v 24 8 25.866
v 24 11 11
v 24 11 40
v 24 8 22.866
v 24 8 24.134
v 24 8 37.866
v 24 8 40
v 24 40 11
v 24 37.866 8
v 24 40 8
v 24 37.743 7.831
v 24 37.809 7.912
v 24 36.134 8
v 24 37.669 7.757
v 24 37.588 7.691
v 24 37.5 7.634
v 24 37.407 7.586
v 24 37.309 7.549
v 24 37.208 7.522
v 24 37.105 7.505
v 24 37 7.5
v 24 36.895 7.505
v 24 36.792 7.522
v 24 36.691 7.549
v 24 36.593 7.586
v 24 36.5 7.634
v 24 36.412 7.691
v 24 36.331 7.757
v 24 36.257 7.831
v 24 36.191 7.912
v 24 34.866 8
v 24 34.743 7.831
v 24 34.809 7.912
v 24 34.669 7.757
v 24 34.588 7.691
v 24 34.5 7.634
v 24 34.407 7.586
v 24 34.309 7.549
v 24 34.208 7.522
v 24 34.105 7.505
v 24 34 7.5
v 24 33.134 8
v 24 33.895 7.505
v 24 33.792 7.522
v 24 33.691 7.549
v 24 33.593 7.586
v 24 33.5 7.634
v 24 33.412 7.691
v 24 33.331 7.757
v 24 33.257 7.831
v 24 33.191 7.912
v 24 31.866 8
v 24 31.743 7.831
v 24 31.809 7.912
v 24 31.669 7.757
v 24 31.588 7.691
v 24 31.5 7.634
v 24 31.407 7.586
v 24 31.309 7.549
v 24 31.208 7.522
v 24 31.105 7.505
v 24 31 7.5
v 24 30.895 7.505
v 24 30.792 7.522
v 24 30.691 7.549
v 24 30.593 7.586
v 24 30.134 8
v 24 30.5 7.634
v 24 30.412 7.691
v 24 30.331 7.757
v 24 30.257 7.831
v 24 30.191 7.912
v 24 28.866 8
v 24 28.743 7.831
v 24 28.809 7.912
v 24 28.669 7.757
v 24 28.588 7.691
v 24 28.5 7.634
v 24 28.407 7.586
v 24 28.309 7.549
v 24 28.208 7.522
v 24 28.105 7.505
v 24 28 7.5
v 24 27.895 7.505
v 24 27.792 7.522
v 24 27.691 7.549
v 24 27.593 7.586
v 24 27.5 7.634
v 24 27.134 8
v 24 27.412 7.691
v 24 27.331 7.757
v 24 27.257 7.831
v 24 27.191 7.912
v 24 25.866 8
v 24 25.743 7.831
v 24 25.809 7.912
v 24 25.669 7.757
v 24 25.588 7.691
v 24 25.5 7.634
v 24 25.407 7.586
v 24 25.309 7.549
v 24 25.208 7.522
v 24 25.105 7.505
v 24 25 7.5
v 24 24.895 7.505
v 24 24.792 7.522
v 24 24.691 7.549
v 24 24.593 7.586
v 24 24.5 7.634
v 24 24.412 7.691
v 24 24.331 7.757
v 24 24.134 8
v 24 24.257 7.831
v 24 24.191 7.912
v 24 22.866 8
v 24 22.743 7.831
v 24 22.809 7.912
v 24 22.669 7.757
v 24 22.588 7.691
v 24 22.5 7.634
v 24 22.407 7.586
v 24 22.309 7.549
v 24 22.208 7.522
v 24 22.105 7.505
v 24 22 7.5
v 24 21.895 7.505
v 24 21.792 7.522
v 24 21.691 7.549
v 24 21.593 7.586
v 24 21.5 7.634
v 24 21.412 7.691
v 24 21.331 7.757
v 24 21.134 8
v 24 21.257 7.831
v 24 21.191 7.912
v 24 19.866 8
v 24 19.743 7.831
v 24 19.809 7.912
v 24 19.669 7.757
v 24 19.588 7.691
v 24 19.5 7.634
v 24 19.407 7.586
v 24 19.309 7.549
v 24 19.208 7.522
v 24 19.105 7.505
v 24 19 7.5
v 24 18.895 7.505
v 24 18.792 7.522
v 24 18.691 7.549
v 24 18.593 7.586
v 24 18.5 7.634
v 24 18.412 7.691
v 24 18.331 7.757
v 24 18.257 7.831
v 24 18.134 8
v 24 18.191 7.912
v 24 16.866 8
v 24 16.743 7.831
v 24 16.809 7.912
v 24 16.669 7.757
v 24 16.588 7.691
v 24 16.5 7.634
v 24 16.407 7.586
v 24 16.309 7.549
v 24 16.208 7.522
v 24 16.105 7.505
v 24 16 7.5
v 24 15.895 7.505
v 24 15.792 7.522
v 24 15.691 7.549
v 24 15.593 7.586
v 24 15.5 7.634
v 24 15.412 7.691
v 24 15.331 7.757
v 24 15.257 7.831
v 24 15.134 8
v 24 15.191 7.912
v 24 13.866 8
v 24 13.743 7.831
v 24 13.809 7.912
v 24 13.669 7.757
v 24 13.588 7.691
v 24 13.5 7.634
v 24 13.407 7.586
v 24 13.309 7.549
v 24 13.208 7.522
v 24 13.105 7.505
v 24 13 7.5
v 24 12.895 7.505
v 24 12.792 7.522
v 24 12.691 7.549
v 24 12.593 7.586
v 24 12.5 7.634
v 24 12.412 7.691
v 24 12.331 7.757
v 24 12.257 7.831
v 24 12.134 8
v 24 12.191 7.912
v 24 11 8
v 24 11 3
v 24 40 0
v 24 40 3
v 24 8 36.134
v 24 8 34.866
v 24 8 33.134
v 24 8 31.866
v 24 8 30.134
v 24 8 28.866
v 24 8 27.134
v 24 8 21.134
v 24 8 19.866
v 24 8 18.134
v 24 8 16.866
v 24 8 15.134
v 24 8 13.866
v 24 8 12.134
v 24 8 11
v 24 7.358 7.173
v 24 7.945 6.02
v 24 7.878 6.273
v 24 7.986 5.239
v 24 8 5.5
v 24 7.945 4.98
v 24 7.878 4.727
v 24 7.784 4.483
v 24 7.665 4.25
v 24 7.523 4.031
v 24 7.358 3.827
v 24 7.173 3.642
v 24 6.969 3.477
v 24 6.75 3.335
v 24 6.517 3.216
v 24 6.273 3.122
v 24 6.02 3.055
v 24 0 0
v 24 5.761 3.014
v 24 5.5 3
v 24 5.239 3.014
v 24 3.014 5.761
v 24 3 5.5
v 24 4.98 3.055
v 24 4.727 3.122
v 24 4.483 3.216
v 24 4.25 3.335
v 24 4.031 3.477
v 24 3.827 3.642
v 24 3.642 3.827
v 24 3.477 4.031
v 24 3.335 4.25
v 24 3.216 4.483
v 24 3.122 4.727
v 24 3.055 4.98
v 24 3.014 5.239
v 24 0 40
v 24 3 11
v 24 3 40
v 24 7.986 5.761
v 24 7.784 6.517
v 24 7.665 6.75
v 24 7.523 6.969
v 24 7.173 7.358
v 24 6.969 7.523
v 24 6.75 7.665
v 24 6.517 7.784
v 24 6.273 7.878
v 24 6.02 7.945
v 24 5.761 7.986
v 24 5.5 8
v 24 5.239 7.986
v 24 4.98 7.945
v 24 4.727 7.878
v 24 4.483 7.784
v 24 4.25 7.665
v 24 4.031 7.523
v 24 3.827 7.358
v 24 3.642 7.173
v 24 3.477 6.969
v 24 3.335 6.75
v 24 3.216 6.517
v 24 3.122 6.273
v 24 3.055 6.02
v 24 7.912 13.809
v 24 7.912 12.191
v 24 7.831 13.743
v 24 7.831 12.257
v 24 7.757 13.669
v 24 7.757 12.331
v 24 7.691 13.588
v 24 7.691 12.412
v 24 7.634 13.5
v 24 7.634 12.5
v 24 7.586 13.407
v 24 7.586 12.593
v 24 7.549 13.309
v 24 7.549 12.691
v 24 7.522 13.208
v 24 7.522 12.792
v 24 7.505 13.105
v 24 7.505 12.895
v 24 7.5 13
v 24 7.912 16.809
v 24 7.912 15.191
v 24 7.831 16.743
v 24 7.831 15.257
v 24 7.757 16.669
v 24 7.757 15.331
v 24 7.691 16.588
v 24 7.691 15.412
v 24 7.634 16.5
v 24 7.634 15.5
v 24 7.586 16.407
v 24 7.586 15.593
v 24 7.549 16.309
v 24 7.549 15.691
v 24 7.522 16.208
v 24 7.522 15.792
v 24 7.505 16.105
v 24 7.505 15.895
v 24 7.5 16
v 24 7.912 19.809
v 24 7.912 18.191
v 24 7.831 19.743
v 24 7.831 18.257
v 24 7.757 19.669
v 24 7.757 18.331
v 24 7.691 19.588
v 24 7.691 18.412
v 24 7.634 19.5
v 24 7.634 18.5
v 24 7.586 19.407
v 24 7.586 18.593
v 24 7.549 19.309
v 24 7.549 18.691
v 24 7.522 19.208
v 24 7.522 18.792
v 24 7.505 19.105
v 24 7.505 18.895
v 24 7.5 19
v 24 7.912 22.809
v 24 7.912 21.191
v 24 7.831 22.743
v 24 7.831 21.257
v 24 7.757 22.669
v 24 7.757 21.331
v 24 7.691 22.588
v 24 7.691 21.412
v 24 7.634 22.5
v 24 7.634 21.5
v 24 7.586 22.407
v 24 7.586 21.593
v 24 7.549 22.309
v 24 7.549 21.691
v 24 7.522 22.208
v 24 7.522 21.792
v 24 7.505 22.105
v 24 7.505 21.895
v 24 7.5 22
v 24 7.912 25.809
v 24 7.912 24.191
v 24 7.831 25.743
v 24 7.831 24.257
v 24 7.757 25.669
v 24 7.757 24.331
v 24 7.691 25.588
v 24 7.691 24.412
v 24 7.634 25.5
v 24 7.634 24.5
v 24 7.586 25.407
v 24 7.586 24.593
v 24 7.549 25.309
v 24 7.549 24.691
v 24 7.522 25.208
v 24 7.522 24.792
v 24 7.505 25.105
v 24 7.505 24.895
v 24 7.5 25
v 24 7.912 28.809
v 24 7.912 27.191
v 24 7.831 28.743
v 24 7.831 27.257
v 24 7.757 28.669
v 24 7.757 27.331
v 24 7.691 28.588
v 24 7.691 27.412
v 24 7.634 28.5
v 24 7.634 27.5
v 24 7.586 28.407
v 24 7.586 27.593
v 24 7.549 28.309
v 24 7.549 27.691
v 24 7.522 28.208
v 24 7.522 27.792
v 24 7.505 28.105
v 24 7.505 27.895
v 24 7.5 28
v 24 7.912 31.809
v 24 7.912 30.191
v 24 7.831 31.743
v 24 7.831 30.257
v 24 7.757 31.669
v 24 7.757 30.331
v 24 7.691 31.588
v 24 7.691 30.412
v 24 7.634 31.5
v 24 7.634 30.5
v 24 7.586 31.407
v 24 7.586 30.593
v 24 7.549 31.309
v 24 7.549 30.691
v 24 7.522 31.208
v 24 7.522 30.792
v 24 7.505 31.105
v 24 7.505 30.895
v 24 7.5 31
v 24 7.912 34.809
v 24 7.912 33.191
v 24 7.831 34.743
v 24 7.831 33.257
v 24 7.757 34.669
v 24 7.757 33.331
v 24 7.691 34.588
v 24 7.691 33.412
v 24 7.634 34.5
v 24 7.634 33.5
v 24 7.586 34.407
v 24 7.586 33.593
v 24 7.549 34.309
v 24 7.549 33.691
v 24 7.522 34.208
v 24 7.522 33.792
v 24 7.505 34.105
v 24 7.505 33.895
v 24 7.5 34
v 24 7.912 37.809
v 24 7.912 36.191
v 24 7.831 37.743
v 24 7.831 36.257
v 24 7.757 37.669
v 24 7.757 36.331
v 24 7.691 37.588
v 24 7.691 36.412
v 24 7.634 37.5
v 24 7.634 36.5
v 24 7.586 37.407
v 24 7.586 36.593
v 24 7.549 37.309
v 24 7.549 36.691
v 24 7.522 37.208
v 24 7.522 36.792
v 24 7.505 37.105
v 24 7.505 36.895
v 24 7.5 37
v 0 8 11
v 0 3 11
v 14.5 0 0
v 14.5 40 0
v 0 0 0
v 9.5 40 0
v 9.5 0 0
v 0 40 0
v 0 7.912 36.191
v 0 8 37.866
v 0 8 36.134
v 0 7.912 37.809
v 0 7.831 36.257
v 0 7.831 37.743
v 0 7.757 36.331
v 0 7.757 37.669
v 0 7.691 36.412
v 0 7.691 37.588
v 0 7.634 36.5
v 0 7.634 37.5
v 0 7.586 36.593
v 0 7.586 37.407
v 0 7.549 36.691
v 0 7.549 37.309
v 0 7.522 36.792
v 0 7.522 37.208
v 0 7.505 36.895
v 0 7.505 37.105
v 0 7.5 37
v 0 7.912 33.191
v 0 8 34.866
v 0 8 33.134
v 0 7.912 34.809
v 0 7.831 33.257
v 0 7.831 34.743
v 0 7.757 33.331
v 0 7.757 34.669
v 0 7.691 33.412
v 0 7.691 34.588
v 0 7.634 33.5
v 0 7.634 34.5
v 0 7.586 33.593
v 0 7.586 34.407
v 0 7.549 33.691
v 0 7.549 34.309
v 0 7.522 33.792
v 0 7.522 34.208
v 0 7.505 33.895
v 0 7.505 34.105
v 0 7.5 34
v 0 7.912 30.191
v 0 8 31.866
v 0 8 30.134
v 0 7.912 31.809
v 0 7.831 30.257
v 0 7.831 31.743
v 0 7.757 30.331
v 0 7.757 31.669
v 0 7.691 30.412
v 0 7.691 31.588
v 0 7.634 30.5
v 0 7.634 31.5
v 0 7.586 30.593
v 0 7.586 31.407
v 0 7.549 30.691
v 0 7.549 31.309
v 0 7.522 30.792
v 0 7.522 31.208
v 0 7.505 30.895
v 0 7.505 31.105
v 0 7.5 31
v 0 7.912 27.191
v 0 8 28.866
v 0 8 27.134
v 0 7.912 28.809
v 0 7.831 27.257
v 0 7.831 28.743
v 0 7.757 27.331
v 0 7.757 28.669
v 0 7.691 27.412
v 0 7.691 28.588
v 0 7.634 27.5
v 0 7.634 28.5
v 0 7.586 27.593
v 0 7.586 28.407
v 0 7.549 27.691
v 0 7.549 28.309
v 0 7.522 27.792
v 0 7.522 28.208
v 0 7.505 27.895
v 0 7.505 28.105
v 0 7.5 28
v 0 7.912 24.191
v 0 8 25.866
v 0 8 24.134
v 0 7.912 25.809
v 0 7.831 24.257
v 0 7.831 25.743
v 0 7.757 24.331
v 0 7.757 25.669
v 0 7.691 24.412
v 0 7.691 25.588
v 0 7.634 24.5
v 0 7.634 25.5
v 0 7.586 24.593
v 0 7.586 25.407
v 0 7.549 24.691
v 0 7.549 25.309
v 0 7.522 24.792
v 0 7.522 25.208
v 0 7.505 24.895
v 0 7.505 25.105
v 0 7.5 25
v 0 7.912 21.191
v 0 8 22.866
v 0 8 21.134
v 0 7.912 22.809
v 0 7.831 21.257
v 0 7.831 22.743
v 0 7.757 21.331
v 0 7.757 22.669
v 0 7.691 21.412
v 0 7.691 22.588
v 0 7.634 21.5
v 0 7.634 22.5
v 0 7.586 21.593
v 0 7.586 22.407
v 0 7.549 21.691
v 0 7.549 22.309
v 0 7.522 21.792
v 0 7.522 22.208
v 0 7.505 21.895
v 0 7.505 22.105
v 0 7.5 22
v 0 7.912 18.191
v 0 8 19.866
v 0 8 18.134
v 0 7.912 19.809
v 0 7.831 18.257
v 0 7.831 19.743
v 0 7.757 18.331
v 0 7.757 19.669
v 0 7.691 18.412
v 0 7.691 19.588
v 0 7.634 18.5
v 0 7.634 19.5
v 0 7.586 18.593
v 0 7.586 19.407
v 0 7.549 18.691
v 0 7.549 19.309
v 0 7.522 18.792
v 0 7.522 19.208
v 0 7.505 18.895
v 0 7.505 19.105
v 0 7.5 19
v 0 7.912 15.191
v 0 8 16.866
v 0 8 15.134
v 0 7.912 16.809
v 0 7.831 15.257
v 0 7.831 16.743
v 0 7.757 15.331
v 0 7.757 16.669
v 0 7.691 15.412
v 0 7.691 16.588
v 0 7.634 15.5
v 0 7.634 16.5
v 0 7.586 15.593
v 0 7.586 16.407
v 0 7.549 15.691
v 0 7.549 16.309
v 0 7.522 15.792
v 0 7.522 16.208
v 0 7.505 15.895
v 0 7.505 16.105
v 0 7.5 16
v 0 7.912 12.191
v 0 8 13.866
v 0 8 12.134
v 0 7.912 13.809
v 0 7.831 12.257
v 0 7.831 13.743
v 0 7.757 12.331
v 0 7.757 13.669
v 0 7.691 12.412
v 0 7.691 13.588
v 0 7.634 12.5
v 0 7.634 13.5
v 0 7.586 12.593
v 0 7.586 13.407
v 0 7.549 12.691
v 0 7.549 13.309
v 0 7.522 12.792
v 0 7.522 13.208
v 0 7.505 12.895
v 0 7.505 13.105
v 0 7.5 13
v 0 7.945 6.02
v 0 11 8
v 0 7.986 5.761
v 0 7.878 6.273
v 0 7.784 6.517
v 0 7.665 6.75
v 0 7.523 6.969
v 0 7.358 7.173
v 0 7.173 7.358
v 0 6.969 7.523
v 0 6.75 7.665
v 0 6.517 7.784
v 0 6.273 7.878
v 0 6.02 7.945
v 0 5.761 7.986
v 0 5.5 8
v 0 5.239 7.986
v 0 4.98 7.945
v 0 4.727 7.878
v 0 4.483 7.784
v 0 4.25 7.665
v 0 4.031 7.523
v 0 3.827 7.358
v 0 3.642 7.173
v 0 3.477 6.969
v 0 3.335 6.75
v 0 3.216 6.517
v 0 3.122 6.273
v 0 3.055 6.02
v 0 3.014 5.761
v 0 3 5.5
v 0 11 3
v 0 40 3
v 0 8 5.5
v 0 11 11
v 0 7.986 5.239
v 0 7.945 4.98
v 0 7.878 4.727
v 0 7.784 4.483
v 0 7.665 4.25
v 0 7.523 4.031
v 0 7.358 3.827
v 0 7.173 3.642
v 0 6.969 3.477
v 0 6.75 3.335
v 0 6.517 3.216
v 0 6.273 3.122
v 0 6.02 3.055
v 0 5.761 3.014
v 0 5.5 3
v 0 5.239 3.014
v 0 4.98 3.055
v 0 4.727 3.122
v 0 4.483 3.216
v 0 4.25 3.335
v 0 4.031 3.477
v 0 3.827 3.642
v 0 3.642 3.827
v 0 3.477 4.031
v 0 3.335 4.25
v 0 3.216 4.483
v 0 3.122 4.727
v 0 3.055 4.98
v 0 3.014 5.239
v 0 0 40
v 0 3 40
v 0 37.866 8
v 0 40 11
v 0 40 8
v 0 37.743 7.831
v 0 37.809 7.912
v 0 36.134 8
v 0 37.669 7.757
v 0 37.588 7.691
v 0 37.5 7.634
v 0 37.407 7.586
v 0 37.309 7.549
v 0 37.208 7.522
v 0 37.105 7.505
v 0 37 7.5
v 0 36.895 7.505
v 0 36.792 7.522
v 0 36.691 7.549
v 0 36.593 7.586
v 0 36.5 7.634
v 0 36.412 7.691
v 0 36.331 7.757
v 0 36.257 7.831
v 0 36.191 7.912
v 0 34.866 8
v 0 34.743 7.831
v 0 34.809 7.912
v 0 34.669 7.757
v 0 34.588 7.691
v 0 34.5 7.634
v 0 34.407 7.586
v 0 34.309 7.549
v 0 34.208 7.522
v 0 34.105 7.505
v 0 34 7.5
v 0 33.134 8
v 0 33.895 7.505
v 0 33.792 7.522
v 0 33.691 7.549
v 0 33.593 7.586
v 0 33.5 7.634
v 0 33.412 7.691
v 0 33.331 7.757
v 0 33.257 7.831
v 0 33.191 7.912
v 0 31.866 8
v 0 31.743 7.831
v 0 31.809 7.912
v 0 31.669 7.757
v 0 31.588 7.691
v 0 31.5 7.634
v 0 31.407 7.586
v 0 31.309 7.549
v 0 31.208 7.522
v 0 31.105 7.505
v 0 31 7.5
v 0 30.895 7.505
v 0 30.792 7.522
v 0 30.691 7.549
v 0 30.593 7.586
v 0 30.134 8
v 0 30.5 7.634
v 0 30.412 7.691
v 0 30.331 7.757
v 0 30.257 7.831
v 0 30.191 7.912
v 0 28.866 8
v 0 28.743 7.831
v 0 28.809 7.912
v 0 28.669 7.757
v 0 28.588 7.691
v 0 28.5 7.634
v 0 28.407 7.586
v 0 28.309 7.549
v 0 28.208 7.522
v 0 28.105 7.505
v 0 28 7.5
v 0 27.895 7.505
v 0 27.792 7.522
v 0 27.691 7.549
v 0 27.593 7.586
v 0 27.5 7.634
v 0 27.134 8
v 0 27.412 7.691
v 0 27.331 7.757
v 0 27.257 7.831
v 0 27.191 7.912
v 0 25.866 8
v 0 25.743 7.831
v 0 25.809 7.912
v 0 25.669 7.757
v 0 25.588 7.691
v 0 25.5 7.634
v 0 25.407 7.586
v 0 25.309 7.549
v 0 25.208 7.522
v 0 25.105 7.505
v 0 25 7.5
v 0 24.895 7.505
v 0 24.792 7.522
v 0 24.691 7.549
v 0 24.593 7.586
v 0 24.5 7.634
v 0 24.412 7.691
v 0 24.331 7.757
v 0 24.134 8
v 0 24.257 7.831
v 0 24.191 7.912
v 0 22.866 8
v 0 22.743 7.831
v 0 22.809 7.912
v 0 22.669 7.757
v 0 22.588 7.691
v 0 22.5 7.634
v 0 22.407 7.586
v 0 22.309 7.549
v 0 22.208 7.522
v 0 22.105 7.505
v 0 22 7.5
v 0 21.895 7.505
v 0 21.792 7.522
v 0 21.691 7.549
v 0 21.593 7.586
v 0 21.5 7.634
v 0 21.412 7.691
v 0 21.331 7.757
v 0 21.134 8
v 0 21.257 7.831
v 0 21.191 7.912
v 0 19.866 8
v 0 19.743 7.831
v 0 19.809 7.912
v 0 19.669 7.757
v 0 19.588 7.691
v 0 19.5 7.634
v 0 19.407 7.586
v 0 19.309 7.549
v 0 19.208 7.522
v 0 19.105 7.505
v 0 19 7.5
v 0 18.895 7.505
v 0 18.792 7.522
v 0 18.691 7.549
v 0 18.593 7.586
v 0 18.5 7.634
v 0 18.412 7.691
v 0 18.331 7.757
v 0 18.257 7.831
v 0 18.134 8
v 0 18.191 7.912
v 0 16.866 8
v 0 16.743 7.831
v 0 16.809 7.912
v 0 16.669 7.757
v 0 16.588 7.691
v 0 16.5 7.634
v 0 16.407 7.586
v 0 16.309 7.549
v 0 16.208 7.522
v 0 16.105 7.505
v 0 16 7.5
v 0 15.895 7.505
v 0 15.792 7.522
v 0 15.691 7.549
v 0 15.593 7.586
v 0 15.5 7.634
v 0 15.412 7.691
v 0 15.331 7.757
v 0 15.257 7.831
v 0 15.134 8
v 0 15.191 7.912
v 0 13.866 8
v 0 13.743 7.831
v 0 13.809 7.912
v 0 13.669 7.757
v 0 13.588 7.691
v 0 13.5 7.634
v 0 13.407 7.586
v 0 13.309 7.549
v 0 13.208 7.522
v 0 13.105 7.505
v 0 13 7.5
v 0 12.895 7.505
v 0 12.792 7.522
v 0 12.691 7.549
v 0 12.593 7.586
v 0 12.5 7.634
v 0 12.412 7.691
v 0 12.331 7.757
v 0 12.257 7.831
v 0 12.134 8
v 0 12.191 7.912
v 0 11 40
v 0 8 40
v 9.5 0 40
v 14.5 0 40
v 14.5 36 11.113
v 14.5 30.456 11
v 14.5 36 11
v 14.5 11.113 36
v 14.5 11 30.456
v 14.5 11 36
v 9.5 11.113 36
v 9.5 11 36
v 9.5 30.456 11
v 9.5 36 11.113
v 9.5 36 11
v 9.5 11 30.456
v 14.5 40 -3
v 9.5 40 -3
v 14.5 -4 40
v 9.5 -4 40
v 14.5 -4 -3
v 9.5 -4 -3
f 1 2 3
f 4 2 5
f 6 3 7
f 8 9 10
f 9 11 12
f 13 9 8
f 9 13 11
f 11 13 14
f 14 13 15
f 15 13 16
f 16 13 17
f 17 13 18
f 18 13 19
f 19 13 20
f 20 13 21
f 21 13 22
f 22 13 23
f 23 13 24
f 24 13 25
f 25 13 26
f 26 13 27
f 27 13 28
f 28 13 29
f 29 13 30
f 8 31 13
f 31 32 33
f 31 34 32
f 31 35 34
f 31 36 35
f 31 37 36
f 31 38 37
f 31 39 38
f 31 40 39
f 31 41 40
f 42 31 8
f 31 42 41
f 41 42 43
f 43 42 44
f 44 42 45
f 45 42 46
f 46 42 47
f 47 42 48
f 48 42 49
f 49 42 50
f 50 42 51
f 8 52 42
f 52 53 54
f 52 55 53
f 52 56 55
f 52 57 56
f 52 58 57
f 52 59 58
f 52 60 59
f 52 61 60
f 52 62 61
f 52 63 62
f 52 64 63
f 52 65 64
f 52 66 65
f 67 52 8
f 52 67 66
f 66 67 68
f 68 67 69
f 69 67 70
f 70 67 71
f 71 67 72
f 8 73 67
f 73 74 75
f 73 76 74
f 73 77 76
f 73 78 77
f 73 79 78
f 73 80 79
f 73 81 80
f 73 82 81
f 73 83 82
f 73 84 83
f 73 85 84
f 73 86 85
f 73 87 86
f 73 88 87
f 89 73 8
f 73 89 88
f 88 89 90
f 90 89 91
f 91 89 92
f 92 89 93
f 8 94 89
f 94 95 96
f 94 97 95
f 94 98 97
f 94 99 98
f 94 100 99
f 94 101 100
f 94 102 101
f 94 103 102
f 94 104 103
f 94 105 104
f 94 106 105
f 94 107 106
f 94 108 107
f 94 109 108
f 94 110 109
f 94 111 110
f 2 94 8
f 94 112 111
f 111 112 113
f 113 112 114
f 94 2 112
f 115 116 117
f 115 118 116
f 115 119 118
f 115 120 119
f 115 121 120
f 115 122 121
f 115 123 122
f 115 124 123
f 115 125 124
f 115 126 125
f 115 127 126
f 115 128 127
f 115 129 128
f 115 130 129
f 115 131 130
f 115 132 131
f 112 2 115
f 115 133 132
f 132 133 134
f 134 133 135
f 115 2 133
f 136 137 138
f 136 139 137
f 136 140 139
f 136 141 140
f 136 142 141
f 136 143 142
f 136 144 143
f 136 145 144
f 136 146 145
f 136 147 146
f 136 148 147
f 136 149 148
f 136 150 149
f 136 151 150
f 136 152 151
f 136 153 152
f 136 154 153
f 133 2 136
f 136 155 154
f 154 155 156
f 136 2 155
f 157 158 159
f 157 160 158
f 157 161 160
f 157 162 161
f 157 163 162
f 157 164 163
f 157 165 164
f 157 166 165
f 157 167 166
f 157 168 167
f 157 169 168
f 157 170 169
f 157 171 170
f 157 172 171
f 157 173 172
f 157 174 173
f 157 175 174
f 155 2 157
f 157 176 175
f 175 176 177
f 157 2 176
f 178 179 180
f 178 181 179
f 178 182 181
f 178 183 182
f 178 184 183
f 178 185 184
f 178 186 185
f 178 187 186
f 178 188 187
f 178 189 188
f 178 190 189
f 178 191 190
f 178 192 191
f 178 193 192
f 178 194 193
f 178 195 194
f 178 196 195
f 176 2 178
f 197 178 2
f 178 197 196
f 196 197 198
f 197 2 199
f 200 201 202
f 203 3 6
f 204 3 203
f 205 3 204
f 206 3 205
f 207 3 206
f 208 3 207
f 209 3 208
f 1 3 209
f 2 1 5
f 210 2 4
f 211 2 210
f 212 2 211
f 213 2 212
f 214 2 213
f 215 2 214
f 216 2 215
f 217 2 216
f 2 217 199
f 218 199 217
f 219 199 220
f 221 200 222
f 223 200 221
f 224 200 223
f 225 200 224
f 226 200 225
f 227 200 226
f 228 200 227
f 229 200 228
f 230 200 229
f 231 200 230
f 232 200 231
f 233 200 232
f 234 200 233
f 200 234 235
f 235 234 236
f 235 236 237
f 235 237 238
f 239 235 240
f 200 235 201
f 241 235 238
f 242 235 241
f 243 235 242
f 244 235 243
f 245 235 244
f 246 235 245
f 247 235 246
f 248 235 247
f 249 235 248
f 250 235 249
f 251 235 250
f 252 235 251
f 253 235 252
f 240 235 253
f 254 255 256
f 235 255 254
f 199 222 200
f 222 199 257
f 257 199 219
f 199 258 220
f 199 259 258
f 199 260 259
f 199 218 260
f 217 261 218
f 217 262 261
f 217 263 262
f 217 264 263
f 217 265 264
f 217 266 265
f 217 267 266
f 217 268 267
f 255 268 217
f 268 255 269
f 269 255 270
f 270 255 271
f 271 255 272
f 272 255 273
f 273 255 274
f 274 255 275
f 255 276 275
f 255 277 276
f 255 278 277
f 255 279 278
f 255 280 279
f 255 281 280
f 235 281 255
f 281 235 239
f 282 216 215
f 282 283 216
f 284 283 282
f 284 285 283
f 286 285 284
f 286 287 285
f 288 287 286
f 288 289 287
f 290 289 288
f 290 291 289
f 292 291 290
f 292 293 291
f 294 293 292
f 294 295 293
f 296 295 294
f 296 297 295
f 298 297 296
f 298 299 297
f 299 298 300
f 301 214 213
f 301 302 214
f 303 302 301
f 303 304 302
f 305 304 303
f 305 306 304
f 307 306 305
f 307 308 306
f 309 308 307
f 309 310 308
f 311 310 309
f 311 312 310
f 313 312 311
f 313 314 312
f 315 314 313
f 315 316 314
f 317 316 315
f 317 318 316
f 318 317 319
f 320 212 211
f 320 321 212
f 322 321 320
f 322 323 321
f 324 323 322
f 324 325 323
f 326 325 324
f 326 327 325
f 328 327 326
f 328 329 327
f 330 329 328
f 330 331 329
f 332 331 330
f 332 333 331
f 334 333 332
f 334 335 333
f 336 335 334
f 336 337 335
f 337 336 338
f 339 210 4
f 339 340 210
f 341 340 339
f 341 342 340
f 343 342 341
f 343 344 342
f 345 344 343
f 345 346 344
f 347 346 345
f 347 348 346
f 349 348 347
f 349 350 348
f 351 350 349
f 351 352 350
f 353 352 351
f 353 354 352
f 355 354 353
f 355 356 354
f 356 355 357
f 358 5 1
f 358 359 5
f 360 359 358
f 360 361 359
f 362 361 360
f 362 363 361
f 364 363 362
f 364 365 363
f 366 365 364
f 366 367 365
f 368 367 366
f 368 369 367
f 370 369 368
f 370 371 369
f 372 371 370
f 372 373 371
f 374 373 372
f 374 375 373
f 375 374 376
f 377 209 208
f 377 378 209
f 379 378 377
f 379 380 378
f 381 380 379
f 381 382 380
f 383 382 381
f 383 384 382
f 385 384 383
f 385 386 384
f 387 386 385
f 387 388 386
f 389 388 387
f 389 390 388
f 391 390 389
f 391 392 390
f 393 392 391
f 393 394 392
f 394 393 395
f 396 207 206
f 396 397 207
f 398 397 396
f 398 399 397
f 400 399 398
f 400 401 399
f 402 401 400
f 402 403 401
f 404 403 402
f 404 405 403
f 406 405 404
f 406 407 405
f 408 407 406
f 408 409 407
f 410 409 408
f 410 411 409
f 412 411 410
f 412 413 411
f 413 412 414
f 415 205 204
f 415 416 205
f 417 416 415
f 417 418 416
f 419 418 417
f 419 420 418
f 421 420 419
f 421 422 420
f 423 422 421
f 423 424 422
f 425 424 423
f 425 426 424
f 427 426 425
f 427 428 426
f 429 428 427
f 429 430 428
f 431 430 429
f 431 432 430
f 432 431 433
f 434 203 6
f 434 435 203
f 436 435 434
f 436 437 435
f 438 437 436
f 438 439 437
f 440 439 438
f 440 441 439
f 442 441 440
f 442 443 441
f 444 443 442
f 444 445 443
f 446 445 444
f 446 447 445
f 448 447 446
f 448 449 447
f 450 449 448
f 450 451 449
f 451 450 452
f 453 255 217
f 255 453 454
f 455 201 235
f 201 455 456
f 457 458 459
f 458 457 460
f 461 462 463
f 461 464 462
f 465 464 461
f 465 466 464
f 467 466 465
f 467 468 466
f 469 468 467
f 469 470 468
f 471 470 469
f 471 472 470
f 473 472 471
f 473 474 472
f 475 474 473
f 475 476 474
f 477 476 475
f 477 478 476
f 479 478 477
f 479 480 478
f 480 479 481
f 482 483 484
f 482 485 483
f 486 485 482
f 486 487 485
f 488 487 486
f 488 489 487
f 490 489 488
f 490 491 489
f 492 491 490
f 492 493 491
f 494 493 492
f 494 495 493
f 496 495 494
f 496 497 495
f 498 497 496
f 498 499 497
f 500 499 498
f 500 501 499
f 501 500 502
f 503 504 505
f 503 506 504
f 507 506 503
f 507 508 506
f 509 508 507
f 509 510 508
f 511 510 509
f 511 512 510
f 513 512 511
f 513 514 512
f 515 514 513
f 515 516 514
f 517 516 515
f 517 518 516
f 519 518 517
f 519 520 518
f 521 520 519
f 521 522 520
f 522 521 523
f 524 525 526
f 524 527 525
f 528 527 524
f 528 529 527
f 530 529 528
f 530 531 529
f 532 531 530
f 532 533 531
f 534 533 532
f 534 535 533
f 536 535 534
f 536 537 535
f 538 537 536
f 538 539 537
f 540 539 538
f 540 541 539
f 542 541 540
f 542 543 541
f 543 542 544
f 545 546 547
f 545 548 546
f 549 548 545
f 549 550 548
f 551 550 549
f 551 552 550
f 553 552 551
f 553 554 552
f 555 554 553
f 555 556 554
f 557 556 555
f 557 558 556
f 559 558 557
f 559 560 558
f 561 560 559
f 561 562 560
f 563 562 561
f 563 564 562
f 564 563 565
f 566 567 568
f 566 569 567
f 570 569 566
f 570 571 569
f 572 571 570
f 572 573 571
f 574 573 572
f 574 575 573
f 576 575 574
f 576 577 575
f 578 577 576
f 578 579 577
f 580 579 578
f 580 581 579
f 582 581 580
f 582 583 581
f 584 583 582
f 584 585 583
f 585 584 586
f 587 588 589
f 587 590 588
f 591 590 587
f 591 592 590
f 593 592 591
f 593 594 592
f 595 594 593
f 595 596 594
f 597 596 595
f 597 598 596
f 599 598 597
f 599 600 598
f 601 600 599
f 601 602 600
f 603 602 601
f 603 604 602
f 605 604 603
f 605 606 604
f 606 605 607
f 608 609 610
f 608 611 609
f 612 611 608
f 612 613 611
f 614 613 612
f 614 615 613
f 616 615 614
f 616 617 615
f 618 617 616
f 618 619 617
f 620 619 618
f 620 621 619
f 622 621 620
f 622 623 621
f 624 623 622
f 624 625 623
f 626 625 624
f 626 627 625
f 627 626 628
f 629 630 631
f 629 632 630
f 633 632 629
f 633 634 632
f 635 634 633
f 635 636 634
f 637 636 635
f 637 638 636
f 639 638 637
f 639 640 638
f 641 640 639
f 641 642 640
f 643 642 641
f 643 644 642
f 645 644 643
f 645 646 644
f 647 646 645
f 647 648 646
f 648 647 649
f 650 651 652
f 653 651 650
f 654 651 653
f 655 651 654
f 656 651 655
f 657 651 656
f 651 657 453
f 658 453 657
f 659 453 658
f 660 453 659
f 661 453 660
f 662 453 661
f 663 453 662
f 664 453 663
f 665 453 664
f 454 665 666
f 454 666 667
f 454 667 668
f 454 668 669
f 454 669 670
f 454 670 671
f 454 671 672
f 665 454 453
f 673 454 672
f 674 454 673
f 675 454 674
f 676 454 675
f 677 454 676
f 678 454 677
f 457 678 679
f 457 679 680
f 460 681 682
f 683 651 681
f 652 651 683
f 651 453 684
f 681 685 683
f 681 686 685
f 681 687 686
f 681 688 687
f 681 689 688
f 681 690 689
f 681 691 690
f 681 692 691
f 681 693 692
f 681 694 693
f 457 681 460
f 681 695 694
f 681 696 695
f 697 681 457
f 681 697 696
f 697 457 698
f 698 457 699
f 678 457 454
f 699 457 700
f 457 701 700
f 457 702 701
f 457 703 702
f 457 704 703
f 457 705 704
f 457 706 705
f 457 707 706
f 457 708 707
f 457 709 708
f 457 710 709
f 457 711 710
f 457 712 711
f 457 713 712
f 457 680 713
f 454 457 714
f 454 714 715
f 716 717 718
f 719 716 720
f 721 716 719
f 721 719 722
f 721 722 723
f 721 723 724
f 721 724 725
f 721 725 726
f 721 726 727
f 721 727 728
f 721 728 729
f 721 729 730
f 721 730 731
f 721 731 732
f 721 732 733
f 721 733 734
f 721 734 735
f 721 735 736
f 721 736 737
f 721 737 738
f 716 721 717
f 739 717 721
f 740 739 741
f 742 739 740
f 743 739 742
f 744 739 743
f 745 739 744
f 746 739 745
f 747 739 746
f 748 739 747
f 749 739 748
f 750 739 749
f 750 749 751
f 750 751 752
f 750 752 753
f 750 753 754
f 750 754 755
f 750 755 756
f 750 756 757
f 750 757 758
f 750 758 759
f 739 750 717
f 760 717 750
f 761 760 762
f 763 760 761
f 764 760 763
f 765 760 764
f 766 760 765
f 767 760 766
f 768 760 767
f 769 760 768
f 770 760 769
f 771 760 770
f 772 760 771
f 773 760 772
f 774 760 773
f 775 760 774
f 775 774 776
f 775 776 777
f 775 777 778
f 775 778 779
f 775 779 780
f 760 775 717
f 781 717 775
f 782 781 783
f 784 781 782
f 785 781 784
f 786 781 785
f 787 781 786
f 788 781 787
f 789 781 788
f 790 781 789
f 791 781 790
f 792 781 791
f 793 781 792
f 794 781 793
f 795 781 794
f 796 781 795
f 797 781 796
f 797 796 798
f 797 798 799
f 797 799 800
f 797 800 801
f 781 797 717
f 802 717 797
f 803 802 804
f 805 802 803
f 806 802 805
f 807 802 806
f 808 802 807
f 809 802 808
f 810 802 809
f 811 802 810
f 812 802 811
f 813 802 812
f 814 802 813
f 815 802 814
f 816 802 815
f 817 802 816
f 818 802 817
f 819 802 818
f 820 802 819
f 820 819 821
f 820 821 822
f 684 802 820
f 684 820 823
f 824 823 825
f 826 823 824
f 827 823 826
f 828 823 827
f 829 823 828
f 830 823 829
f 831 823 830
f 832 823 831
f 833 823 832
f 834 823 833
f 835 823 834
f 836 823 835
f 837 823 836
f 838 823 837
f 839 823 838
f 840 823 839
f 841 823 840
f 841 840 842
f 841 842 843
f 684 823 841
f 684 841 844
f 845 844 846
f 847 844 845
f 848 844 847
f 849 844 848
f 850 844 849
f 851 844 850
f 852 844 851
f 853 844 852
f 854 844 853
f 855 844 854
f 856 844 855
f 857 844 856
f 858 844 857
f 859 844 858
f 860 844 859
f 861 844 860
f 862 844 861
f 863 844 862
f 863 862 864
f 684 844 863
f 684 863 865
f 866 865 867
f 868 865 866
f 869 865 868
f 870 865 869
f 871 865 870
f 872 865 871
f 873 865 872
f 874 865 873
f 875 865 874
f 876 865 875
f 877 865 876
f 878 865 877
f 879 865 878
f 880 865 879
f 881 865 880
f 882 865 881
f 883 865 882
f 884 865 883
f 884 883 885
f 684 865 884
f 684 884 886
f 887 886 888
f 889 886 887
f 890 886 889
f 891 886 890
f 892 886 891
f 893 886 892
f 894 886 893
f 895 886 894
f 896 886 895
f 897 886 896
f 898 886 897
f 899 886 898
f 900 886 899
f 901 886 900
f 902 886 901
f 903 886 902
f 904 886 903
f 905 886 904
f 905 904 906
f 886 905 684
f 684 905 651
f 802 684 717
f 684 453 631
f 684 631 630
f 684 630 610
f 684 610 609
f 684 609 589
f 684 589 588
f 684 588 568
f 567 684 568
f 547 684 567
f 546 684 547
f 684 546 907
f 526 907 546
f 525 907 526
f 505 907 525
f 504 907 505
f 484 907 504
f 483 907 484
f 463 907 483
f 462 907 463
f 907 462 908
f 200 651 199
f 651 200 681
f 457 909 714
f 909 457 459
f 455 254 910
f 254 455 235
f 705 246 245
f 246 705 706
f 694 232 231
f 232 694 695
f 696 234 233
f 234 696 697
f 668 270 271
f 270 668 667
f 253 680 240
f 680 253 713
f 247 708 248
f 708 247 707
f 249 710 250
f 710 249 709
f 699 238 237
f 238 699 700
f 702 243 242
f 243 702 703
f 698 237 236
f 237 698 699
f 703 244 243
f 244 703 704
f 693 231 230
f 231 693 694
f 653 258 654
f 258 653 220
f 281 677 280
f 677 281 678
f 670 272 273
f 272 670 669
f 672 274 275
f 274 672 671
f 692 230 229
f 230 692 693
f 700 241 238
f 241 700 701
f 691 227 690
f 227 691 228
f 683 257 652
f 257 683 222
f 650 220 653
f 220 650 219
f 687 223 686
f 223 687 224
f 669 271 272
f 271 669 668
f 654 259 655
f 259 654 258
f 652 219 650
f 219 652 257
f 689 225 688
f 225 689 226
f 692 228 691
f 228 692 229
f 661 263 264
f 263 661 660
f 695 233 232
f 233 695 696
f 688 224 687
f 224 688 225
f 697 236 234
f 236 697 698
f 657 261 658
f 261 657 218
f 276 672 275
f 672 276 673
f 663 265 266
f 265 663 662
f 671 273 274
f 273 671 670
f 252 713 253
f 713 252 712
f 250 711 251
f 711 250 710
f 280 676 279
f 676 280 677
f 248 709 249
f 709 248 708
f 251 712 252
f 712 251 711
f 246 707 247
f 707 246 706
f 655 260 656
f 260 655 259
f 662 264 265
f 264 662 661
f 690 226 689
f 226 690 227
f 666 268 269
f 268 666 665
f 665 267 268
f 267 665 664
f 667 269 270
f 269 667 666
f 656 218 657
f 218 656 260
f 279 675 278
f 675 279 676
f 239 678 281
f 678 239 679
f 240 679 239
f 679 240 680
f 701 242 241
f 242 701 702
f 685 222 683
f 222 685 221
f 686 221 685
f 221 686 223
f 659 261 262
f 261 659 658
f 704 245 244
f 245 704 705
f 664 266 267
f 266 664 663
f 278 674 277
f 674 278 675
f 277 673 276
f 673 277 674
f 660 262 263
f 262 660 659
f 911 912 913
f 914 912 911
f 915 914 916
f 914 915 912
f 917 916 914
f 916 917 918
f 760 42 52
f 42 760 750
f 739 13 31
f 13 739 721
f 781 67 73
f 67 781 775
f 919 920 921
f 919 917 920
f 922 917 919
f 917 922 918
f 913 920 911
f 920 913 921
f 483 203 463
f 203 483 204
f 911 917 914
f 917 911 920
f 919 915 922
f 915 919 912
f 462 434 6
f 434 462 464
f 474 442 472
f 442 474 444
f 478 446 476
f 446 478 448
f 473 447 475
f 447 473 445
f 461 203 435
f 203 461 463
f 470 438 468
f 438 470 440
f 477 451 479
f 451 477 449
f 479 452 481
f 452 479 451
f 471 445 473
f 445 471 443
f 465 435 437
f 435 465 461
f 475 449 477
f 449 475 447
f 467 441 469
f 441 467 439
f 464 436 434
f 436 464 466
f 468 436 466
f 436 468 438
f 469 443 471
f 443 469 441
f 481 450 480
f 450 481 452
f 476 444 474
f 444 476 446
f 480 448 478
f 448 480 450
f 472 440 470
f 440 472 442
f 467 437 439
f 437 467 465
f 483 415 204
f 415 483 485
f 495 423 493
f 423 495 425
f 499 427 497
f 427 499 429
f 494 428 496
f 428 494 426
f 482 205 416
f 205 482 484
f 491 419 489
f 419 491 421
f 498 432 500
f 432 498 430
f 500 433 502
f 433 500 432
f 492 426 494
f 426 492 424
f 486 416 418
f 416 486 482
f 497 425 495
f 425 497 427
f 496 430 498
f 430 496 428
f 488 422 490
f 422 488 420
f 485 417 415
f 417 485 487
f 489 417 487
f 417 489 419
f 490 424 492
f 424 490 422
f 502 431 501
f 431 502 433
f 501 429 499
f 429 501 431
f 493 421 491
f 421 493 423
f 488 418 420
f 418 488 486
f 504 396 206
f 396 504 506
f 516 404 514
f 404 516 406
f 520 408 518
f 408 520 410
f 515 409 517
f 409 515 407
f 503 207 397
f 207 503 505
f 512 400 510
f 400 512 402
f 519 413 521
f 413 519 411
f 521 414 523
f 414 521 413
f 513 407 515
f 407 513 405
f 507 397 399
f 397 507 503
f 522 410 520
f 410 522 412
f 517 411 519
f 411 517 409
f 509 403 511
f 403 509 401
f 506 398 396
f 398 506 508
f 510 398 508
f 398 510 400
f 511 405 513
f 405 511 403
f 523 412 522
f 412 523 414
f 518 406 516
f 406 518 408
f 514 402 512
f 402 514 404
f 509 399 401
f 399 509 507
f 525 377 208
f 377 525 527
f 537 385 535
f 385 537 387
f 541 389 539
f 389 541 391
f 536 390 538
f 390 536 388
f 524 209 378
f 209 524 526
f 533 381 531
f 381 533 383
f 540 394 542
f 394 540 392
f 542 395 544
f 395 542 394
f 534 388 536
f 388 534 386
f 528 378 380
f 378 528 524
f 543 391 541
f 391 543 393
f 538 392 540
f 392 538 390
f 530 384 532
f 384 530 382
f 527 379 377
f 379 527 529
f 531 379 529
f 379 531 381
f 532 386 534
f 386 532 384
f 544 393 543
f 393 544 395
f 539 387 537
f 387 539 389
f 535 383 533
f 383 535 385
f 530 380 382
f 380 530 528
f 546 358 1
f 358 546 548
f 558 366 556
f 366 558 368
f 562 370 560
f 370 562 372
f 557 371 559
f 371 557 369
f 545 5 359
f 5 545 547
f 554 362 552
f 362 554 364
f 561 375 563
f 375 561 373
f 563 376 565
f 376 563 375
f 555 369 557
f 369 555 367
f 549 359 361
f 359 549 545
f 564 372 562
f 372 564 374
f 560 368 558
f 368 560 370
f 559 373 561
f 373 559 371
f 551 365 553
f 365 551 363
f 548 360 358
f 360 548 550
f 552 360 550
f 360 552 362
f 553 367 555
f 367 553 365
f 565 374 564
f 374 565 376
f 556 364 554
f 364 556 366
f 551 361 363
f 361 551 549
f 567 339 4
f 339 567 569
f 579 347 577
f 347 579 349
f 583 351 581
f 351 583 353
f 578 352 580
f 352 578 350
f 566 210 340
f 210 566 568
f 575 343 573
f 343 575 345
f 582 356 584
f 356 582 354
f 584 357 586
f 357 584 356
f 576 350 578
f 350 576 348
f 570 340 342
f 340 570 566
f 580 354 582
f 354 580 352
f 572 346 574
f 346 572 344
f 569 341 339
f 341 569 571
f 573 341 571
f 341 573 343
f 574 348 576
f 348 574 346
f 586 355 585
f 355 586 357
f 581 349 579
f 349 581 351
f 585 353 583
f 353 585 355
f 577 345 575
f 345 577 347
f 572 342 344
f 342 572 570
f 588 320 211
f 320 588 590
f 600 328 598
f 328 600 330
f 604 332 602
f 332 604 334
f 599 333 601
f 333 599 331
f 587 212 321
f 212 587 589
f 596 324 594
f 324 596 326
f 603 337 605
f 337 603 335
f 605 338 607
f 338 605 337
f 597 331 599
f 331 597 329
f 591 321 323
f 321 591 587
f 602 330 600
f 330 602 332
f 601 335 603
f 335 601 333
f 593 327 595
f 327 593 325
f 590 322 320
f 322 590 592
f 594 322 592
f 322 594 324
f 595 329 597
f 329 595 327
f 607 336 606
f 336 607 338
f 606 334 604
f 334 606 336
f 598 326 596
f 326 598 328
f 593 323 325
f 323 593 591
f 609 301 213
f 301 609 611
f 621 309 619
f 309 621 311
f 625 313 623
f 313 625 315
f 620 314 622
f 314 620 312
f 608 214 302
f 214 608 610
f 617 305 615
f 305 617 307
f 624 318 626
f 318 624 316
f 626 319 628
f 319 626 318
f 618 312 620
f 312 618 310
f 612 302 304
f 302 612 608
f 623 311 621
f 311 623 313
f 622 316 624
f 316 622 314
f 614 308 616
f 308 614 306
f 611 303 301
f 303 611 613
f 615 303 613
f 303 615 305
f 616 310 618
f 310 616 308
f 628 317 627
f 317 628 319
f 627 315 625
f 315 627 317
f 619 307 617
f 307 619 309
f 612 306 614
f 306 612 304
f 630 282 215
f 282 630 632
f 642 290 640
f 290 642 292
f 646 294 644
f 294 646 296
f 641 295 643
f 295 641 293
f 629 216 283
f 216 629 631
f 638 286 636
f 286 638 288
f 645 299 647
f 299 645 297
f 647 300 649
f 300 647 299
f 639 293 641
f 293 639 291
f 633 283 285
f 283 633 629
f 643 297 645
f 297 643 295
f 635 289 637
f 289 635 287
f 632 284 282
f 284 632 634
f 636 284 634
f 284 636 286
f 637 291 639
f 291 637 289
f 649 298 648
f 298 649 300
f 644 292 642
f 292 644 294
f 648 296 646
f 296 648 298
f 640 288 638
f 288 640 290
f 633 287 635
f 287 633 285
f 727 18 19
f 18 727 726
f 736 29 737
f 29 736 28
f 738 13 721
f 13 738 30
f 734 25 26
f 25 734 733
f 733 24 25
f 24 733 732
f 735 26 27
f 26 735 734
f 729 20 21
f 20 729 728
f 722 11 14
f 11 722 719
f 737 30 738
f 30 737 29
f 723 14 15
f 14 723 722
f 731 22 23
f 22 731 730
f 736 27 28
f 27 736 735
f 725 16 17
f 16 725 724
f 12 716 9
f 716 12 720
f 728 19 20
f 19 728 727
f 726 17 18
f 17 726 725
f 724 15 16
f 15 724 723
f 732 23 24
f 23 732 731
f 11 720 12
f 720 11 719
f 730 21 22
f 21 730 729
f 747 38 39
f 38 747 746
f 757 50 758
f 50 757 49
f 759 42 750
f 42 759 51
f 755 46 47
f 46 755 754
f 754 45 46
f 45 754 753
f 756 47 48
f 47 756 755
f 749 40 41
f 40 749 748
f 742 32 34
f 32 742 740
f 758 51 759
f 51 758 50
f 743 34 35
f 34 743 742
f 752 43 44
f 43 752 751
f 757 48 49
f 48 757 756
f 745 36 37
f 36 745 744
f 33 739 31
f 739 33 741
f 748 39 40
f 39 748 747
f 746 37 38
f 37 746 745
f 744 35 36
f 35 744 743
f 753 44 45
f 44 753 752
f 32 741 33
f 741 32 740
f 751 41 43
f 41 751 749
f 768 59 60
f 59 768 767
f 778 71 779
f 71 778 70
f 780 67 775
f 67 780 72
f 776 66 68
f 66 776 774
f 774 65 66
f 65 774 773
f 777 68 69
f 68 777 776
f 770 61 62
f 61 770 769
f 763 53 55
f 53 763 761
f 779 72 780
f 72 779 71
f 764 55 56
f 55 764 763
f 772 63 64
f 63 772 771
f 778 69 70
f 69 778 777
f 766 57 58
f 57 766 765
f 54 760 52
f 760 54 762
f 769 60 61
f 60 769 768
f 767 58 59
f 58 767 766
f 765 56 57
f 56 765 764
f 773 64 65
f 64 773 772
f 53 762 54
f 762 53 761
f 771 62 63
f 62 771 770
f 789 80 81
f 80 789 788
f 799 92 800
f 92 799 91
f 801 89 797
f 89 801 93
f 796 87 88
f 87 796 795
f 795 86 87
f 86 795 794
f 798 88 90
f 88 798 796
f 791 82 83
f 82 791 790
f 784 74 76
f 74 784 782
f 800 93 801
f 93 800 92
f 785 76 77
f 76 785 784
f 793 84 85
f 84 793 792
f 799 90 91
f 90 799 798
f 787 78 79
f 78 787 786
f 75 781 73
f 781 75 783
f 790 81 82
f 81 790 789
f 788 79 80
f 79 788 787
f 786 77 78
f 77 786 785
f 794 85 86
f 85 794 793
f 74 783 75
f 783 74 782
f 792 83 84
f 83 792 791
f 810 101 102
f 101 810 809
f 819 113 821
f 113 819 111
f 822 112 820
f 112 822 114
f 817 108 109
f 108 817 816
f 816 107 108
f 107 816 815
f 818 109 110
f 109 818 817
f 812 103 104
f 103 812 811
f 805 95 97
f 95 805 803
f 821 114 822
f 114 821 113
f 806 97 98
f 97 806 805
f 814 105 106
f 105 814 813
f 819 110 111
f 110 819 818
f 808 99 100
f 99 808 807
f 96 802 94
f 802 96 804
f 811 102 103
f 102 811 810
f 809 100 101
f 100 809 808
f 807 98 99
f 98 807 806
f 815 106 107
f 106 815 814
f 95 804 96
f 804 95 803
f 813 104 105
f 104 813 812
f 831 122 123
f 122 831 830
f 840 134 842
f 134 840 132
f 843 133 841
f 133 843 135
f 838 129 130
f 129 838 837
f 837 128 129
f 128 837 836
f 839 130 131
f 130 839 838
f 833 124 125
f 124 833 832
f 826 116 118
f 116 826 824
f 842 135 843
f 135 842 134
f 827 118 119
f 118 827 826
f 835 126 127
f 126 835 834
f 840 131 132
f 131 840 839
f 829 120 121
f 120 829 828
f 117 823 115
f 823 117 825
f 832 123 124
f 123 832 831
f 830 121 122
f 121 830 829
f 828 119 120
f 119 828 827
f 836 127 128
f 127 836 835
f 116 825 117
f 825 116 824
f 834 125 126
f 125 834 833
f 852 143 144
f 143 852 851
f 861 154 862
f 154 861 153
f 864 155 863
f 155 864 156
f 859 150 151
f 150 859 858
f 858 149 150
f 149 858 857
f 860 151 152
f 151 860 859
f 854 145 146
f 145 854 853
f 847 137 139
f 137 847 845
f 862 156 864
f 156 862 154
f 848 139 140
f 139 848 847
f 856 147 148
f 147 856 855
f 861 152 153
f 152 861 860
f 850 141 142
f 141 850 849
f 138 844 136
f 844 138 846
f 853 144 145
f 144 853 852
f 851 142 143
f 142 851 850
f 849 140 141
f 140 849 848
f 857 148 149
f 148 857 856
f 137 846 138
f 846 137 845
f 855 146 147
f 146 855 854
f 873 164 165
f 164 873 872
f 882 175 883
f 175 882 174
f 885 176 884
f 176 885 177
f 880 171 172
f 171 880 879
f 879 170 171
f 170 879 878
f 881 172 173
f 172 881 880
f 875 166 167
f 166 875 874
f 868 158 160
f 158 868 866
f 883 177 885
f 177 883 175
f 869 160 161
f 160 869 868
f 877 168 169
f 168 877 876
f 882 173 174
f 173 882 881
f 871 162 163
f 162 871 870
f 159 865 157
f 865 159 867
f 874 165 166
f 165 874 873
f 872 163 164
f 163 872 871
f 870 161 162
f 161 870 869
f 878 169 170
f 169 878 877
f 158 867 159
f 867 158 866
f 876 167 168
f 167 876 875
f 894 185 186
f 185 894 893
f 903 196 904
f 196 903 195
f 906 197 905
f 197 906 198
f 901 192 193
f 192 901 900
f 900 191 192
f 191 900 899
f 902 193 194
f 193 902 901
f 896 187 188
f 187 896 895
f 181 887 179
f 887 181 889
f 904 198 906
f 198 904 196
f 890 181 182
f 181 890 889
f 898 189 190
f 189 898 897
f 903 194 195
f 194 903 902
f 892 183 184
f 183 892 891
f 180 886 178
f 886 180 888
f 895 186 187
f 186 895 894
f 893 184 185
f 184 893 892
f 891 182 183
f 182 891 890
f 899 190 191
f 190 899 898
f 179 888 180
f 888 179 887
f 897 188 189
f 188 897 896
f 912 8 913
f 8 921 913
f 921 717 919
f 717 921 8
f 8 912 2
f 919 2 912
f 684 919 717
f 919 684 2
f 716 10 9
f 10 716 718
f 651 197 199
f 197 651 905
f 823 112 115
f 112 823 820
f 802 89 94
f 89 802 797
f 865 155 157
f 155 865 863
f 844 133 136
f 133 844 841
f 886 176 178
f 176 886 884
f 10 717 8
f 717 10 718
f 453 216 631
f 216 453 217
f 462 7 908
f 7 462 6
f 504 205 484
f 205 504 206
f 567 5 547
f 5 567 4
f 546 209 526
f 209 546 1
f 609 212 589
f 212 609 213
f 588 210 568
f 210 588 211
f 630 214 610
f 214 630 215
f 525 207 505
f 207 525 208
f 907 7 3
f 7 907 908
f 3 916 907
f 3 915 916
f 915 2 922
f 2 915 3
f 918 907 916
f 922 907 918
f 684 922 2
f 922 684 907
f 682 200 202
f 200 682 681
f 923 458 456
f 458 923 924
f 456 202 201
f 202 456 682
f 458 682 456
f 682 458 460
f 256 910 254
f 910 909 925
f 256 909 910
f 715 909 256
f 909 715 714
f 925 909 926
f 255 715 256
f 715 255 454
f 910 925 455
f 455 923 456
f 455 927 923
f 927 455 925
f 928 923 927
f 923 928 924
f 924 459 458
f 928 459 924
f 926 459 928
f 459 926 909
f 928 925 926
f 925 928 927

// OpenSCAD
$fn = 60;

w = 24;
h = 40;

cube([w, h, 3]);
cube([w, 3, h]);

difference() {
    cube([w, 11, 11]);
    rotate([0, 90, 0]) translate([-5.5, 5.5, -1]) cylinder(h = 50, d = 5);
}

translate([w/2 - 2.5, 8, 8]) { 
    difference() {
        cube([5, 28, 28]);
        rotate([45, 0, 0]) translate([-0.5, 22, -18]) cube([6, 37, 37]);
        rotate([45, 0, 0]) translate([-0.5, -19, -15]) cube([6, 37, 37]);
    }
}

translate([0, 3 + 5, 3 + 5]) {
    cube([w, h - 8, 3]);
    cube([w, 3, h - 8]);
    
    rotate([0, 90, 0]) {        
        for (i = [1 : 9]) {
            translate([-32 + i * 3, 0.5, 0]) {
                cylinder(d = 2, h = w);
            }
        }
    }
    
    rotate([-90, 0, -90]) {        
        for (i = [1 : 9]) {
            translate([-32 + i * 3, -0.5, 0]) {
                cylinder(d = 2, h = w);
            }
        }
    }
}


translate([w/2 - 2.5, 0, -3]) {
    cube([5, h, 4]);
}

translate([w/2 - 2.5, -4, -3]) {
    cube([5, 4, h + 3]);
}
